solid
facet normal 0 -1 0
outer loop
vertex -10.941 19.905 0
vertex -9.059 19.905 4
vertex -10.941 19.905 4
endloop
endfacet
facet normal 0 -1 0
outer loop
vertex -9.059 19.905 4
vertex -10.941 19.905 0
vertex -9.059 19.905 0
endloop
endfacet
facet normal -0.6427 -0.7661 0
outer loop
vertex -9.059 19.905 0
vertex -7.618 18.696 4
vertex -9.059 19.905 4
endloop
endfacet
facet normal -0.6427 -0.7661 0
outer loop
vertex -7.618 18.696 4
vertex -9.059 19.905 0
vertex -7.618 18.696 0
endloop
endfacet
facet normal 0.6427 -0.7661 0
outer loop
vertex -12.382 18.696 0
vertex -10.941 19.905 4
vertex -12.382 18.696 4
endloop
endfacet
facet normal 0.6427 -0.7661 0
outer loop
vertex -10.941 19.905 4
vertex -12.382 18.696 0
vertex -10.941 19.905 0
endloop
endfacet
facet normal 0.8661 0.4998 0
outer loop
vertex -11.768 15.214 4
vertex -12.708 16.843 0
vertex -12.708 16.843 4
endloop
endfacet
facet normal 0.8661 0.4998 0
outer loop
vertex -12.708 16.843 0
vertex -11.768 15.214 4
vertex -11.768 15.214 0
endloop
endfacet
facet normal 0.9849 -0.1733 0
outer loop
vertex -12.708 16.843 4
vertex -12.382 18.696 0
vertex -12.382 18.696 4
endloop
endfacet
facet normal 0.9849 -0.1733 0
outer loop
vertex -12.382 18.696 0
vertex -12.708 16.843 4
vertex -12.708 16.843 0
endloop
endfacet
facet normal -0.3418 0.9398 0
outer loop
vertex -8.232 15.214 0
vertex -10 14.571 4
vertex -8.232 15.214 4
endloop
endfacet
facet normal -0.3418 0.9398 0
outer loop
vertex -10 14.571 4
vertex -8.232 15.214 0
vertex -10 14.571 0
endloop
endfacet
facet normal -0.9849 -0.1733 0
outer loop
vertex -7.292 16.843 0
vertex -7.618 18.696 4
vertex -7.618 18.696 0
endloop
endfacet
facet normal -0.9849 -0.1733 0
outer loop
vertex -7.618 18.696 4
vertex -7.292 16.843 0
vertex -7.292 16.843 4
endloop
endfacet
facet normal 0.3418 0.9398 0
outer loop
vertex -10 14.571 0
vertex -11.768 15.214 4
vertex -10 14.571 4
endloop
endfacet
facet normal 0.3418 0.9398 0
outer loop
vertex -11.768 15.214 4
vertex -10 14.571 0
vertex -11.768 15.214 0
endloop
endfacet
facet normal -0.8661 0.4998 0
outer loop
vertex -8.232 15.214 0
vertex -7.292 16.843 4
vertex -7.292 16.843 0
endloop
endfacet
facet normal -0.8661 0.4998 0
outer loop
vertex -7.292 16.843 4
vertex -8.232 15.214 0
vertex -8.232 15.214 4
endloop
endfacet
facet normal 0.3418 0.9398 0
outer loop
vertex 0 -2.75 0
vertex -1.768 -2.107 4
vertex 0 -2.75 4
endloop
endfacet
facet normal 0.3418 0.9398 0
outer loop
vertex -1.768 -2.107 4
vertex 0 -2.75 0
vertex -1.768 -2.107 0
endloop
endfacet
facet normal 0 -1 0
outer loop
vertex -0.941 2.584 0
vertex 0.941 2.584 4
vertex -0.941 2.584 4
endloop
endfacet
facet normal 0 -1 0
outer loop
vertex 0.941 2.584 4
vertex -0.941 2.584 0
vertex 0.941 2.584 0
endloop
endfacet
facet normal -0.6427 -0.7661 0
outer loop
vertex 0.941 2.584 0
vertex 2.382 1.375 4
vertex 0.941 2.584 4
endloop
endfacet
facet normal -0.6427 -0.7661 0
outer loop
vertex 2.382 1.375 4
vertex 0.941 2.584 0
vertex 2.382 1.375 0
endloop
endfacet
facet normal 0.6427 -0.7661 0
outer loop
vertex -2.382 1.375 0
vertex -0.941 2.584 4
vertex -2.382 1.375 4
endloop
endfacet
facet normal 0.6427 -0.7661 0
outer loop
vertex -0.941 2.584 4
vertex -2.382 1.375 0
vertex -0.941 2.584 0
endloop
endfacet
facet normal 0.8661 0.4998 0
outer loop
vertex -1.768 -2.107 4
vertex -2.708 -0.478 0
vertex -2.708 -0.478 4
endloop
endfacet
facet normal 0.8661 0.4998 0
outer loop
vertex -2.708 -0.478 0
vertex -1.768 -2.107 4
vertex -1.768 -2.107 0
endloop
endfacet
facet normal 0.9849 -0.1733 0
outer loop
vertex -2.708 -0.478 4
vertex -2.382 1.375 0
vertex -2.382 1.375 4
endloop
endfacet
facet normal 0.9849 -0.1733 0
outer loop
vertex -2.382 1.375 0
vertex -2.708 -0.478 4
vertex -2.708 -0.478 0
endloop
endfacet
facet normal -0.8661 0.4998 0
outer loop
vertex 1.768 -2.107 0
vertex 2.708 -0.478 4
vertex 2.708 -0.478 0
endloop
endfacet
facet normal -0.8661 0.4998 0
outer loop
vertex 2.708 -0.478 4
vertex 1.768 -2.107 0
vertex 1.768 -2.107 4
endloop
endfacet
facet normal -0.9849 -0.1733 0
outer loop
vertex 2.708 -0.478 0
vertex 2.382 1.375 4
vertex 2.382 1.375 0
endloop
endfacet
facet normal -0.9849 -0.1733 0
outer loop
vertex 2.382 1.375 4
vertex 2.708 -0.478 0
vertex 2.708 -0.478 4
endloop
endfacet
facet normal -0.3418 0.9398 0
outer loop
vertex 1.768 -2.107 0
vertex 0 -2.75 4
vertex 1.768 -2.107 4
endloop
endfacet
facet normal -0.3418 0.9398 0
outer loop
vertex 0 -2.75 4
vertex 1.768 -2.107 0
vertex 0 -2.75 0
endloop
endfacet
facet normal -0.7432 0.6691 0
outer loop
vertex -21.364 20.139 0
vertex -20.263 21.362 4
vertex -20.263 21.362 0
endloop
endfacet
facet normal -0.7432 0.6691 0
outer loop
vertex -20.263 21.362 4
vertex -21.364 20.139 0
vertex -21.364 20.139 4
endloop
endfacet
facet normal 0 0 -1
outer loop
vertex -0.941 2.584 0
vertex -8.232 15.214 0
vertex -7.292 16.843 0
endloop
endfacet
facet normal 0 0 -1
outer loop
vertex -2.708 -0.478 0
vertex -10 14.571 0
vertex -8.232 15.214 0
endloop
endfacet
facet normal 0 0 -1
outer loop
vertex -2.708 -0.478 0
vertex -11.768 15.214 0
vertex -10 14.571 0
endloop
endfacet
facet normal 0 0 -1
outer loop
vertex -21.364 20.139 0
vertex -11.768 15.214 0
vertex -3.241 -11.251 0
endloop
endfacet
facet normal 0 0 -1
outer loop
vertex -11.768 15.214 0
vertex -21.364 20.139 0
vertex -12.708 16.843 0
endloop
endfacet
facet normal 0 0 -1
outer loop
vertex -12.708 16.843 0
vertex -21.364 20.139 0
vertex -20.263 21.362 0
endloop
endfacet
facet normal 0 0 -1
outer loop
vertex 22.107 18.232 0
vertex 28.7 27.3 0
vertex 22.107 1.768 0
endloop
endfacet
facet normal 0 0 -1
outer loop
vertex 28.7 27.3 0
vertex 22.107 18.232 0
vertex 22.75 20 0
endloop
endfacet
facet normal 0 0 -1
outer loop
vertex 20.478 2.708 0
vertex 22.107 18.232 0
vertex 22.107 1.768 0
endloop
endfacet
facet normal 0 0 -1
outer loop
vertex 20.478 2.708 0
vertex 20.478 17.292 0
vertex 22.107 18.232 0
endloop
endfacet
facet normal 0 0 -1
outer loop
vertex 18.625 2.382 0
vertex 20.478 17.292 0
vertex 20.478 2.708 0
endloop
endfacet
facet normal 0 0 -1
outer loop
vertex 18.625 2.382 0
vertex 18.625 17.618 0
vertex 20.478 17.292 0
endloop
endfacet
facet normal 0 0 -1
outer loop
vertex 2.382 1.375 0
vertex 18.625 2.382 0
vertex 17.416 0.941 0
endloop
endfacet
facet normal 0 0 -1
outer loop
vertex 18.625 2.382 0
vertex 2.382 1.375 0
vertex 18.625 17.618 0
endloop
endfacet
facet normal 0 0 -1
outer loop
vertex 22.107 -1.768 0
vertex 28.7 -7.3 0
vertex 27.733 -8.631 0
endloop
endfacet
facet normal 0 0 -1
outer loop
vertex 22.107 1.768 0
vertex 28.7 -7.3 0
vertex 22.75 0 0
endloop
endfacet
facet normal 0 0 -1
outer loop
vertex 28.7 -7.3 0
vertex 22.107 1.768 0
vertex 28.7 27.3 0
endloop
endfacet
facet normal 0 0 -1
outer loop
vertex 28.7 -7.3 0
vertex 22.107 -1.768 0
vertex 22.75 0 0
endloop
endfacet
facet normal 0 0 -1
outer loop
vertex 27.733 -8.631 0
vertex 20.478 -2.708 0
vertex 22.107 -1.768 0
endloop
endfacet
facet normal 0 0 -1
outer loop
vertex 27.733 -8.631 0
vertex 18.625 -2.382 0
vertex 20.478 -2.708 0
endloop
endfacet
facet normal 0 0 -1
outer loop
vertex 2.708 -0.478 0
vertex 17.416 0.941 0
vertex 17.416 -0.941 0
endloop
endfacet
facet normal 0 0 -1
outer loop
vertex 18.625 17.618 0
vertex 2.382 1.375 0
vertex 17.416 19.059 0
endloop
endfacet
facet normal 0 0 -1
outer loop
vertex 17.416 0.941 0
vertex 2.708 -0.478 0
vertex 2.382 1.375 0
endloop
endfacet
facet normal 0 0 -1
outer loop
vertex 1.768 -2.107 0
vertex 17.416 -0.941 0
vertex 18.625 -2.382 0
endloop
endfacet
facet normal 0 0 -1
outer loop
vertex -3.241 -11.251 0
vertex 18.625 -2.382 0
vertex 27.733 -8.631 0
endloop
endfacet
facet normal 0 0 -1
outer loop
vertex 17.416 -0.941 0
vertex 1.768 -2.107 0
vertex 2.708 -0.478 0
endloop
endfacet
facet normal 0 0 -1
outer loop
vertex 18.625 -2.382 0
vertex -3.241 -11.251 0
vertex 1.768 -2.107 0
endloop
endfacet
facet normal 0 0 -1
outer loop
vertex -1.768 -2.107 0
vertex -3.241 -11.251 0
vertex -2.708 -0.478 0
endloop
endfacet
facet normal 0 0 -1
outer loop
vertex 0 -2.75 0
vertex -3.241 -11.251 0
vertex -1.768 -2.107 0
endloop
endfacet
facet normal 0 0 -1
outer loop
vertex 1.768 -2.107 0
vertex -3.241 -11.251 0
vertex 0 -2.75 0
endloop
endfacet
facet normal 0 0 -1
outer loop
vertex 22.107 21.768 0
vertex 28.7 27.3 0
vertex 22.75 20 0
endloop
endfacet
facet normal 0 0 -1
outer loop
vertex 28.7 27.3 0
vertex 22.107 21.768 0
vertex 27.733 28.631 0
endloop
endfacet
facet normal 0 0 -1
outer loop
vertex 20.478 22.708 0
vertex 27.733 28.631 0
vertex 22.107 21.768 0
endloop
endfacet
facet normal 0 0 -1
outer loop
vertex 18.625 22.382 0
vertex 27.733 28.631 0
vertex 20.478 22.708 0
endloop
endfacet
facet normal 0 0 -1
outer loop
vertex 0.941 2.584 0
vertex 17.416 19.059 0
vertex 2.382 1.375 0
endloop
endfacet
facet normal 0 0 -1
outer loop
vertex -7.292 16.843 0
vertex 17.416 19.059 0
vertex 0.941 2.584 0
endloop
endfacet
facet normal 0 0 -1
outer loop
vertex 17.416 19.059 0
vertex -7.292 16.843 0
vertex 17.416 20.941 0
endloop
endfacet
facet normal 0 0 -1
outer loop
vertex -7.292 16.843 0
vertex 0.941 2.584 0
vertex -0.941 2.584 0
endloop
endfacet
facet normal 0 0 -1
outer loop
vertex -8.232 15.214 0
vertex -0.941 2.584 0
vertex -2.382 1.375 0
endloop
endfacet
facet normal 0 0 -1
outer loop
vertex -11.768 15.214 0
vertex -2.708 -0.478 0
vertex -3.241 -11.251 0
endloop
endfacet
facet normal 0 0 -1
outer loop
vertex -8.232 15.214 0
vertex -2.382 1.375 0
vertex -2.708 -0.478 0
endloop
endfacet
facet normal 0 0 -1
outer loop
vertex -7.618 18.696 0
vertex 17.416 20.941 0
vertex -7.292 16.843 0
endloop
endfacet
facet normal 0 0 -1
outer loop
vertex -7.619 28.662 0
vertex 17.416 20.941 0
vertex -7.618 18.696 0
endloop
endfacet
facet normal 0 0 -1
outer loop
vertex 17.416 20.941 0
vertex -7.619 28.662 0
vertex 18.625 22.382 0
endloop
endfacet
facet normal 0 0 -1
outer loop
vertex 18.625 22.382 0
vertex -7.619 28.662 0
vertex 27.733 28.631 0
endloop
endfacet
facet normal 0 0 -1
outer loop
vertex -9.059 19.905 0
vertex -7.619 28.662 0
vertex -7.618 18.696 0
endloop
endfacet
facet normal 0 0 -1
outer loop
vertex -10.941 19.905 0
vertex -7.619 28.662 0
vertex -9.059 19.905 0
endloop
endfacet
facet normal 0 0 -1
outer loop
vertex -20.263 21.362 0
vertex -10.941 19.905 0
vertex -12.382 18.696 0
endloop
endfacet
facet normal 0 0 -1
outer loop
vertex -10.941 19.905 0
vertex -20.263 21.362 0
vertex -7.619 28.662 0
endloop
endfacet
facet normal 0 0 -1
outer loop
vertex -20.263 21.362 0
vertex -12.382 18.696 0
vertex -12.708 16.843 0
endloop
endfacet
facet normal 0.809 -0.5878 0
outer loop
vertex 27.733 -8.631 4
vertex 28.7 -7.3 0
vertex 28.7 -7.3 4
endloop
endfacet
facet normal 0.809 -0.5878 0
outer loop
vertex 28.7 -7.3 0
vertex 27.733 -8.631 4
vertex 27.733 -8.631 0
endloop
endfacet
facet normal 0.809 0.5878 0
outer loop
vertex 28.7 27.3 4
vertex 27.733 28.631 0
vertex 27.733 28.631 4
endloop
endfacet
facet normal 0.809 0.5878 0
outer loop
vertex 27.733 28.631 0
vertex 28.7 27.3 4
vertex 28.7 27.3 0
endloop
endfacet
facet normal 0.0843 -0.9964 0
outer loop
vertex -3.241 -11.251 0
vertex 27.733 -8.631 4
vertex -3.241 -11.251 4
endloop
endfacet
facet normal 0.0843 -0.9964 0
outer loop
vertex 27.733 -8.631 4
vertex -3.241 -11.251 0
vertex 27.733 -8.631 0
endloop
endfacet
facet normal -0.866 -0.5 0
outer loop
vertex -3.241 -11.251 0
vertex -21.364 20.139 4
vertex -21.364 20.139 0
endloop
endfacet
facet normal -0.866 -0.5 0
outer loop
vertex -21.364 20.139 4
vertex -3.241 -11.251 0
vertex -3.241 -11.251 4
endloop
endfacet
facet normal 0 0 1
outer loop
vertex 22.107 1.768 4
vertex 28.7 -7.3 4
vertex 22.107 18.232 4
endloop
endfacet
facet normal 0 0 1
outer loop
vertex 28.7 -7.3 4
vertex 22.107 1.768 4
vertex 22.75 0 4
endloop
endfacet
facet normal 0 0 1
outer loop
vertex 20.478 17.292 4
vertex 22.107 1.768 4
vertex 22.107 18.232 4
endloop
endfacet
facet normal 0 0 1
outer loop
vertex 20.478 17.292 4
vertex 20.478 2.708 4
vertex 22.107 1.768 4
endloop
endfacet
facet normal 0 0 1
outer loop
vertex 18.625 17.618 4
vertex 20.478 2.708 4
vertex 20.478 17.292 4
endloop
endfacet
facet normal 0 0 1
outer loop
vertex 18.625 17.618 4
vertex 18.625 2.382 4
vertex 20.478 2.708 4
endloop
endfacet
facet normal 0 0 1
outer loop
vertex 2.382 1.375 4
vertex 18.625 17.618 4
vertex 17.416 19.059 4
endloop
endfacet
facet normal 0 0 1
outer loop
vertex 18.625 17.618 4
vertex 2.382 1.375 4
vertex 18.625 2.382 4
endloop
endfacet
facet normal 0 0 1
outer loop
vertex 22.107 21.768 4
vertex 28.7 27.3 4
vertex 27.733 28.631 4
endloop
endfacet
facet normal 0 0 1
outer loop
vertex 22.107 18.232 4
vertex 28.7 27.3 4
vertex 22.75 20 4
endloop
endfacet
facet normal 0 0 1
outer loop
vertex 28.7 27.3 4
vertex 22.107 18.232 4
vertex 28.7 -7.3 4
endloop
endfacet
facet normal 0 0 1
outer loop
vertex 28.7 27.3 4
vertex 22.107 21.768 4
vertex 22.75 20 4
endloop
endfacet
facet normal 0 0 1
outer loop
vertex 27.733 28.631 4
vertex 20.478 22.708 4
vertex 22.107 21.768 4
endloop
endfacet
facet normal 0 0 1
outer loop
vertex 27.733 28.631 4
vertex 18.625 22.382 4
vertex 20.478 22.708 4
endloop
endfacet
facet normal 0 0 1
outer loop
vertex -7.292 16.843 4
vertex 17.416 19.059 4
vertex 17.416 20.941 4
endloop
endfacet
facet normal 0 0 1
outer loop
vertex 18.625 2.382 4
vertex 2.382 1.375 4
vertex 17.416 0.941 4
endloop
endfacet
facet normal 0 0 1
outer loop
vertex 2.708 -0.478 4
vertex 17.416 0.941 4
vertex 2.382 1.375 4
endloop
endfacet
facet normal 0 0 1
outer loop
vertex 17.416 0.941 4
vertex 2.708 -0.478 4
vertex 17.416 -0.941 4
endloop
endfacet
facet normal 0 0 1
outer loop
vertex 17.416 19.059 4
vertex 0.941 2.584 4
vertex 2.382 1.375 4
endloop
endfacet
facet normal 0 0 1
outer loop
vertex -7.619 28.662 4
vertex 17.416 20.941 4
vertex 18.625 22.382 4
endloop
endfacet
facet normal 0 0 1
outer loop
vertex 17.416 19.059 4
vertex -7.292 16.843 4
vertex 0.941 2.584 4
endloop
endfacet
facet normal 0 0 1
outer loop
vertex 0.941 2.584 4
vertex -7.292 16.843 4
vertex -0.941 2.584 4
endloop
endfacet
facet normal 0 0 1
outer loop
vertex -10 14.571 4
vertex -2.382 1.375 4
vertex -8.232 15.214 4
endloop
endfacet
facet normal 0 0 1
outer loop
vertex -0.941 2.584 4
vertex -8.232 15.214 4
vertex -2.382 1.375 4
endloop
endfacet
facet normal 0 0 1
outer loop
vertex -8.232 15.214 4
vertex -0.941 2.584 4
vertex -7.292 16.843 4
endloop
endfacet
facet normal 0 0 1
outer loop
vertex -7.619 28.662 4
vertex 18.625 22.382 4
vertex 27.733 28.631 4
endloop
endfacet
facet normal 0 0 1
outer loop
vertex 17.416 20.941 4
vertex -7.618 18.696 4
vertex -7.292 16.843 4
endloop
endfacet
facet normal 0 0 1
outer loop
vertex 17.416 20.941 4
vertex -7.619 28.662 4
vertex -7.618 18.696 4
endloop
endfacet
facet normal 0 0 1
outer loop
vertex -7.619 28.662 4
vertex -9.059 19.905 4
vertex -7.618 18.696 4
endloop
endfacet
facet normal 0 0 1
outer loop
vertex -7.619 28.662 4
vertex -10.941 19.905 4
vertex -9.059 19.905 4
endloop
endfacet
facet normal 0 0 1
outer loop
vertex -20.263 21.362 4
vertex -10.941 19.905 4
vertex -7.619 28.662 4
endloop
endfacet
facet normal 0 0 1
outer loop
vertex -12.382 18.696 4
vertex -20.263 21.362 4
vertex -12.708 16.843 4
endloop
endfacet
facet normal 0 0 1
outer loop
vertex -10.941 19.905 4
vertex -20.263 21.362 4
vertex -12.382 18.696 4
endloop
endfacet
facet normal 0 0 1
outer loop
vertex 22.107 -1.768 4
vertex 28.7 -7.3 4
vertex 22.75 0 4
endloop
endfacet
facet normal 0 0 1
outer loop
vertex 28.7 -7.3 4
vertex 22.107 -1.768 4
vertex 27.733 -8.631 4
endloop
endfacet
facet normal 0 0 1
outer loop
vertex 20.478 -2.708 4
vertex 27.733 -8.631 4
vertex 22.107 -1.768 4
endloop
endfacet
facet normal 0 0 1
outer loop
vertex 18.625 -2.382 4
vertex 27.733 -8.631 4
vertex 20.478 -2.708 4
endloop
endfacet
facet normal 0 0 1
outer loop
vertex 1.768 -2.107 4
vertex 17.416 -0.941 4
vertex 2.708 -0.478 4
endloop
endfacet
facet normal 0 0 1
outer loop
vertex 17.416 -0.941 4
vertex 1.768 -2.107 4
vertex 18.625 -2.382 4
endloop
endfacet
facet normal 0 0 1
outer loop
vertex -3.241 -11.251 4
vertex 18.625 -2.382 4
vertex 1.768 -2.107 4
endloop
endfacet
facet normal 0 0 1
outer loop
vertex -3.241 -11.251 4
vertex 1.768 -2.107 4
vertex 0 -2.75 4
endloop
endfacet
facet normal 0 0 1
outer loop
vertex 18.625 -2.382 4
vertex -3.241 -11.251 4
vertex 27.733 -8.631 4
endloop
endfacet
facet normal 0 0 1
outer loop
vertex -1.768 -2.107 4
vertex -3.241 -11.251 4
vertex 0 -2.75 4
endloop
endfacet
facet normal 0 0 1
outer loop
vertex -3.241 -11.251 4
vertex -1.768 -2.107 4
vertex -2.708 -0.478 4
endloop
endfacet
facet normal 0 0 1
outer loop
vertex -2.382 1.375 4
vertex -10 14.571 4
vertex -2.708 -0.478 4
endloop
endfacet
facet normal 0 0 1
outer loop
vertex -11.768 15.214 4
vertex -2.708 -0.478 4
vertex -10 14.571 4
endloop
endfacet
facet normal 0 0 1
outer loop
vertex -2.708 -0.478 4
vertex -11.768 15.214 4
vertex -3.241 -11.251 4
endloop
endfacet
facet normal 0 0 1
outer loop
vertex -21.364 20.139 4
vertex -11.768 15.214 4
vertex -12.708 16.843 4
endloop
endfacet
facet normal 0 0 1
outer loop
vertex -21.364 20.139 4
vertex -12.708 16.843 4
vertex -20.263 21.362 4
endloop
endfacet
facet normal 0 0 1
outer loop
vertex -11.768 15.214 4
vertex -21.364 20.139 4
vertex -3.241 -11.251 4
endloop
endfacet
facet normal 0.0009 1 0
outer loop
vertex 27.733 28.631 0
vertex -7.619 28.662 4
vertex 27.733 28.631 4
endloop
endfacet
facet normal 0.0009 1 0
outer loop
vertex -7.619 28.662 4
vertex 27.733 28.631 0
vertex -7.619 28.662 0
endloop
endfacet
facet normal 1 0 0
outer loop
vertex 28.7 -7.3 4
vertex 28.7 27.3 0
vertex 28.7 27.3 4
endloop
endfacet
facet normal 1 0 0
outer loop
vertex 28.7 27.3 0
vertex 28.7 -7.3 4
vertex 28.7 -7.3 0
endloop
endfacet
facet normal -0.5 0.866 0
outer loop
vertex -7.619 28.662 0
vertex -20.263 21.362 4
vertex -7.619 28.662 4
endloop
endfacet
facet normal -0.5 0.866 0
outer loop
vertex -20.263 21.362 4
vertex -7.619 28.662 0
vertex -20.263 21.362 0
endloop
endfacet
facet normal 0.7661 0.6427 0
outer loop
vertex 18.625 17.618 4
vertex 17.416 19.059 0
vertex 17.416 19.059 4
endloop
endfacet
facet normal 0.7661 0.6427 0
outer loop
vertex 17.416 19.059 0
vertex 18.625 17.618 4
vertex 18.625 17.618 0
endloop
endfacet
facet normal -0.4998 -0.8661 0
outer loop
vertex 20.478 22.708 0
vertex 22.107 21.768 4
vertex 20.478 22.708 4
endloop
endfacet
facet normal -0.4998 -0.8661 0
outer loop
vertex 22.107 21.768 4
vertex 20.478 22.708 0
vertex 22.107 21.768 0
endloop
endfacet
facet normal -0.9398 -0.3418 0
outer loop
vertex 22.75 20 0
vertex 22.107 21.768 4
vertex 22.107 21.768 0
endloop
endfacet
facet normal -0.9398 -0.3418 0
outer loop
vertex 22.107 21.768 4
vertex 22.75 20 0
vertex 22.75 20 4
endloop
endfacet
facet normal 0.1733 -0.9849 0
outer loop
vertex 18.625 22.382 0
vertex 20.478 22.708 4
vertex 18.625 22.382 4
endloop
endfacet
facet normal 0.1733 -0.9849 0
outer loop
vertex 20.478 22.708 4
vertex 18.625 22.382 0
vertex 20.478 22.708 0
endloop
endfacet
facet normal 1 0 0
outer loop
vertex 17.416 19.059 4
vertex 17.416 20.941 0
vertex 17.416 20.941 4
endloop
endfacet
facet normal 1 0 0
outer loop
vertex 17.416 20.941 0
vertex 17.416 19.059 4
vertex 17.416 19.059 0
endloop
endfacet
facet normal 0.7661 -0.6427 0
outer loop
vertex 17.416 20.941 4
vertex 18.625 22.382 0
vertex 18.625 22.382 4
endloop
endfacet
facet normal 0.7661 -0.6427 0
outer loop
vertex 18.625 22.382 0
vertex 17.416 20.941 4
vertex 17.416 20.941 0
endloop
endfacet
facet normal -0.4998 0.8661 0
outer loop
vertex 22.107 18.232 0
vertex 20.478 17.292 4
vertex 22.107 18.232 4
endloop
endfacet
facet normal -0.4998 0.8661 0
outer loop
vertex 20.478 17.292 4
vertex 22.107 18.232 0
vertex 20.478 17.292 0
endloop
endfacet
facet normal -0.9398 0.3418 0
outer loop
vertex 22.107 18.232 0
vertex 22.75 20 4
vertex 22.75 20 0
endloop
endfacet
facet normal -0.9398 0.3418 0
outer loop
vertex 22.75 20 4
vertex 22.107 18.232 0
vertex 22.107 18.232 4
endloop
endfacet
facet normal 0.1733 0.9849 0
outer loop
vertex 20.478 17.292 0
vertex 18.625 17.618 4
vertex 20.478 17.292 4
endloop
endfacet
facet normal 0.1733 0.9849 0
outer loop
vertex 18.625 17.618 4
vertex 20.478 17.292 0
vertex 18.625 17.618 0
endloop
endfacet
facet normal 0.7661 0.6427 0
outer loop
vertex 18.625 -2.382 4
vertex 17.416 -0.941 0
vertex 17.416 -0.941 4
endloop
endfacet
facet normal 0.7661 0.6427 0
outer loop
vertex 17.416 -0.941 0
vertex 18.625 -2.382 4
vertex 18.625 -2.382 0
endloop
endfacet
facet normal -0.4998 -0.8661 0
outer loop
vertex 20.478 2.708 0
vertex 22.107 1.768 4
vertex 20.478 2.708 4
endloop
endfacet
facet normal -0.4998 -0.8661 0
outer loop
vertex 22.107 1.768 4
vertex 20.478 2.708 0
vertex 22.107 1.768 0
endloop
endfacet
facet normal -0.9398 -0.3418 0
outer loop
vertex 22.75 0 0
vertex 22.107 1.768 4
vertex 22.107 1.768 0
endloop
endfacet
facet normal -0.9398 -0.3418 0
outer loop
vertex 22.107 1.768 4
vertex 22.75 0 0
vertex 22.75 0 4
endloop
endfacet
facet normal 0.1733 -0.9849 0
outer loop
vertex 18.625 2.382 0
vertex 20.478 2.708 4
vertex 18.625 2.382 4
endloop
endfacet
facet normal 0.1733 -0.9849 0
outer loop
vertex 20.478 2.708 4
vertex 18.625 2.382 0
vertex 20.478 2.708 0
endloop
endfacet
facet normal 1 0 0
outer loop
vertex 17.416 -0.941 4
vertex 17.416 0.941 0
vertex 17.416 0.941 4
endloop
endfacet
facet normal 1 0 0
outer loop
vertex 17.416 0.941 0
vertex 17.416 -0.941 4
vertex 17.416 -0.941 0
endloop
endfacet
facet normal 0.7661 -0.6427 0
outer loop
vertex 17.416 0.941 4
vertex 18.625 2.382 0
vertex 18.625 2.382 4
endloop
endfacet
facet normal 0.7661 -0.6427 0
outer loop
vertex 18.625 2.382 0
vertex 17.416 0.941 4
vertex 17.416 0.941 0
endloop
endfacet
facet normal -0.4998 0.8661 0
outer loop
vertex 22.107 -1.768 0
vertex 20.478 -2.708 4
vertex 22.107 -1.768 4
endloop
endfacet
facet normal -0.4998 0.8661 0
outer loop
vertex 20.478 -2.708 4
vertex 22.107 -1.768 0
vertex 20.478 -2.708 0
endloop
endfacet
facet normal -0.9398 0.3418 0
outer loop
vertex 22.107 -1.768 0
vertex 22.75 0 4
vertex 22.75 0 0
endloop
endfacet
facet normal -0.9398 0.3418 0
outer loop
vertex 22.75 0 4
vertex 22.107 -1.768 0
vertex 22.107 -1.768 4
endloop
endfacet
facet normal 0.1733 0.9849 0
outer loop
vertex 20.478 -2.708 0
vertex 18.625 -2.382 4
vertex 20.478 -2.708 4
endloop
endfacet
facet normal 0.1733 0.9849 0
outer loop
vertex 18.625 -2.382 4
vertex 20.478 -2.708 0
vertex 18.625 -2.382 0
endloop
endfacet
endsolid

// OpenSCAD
// rob@openpart.co.uk 20140202-02:02
// 4 hole joining plate for 20mm NOMINAL extrusion @ 30 degrees
// V-Slot & others

module roundedRect(size, radius) {
	x = size[0];
	y = size[1];
	z = size[2];
	linear_extrude(height=z)
	hull()
	{
		// place 4 circles in the corners, with the given radius
		translate([(-x/2)+(radius/2), (-y/2)+(radius/2), 0])
		circle(r=radius);
		translate([(x/2)-(radius/2), (-y/2)+(radius/2), 0])
		circle(r=radius);
		translate([(-x/2)+(radius/2), (y/2)-(radius/2), 0])
		circle(r=radius);
		translate([(x/2)-(radius/2), (y/2)-(radius/2), 0])
		circle(r=radius);
	}
}
angle = 30;
hole = 5.5 / 2;
plate_width = 36;
plate_length = 16;
plate_thickness = 4;
extend_past_thickness = 2;
corner_radius = 1.4;
difference() {
	hull () {
		rotate([0,0,angle]) {
			translate([0, 10, 0])
				roundedRect ([plate_length, plate_width, plate_thickness], corner_radius);
		}
		translate([20, 10, 0])
				roundedRect ([plate_length, plate_width, plate_thickness], corner_radius);
		}
		translate([20,20,-1])
			cylinder(h = (extend_past_thickness+plate_thickness+2), r = hole);
		translate([20,0,-1])
			cylinder(h = (extend_past_thickness+plate_thickness+2), r = hole);
		rotate([0,0,angle]) {
			translate([0,20,-1])
				cylinder(h = (extend_past_thickness+plate_thickness+2), r = hole);
			translate([0,0,-1])
				cylinder(h = (extend_past_thickness+plate_thickness+2), r = hole);
		}
}
